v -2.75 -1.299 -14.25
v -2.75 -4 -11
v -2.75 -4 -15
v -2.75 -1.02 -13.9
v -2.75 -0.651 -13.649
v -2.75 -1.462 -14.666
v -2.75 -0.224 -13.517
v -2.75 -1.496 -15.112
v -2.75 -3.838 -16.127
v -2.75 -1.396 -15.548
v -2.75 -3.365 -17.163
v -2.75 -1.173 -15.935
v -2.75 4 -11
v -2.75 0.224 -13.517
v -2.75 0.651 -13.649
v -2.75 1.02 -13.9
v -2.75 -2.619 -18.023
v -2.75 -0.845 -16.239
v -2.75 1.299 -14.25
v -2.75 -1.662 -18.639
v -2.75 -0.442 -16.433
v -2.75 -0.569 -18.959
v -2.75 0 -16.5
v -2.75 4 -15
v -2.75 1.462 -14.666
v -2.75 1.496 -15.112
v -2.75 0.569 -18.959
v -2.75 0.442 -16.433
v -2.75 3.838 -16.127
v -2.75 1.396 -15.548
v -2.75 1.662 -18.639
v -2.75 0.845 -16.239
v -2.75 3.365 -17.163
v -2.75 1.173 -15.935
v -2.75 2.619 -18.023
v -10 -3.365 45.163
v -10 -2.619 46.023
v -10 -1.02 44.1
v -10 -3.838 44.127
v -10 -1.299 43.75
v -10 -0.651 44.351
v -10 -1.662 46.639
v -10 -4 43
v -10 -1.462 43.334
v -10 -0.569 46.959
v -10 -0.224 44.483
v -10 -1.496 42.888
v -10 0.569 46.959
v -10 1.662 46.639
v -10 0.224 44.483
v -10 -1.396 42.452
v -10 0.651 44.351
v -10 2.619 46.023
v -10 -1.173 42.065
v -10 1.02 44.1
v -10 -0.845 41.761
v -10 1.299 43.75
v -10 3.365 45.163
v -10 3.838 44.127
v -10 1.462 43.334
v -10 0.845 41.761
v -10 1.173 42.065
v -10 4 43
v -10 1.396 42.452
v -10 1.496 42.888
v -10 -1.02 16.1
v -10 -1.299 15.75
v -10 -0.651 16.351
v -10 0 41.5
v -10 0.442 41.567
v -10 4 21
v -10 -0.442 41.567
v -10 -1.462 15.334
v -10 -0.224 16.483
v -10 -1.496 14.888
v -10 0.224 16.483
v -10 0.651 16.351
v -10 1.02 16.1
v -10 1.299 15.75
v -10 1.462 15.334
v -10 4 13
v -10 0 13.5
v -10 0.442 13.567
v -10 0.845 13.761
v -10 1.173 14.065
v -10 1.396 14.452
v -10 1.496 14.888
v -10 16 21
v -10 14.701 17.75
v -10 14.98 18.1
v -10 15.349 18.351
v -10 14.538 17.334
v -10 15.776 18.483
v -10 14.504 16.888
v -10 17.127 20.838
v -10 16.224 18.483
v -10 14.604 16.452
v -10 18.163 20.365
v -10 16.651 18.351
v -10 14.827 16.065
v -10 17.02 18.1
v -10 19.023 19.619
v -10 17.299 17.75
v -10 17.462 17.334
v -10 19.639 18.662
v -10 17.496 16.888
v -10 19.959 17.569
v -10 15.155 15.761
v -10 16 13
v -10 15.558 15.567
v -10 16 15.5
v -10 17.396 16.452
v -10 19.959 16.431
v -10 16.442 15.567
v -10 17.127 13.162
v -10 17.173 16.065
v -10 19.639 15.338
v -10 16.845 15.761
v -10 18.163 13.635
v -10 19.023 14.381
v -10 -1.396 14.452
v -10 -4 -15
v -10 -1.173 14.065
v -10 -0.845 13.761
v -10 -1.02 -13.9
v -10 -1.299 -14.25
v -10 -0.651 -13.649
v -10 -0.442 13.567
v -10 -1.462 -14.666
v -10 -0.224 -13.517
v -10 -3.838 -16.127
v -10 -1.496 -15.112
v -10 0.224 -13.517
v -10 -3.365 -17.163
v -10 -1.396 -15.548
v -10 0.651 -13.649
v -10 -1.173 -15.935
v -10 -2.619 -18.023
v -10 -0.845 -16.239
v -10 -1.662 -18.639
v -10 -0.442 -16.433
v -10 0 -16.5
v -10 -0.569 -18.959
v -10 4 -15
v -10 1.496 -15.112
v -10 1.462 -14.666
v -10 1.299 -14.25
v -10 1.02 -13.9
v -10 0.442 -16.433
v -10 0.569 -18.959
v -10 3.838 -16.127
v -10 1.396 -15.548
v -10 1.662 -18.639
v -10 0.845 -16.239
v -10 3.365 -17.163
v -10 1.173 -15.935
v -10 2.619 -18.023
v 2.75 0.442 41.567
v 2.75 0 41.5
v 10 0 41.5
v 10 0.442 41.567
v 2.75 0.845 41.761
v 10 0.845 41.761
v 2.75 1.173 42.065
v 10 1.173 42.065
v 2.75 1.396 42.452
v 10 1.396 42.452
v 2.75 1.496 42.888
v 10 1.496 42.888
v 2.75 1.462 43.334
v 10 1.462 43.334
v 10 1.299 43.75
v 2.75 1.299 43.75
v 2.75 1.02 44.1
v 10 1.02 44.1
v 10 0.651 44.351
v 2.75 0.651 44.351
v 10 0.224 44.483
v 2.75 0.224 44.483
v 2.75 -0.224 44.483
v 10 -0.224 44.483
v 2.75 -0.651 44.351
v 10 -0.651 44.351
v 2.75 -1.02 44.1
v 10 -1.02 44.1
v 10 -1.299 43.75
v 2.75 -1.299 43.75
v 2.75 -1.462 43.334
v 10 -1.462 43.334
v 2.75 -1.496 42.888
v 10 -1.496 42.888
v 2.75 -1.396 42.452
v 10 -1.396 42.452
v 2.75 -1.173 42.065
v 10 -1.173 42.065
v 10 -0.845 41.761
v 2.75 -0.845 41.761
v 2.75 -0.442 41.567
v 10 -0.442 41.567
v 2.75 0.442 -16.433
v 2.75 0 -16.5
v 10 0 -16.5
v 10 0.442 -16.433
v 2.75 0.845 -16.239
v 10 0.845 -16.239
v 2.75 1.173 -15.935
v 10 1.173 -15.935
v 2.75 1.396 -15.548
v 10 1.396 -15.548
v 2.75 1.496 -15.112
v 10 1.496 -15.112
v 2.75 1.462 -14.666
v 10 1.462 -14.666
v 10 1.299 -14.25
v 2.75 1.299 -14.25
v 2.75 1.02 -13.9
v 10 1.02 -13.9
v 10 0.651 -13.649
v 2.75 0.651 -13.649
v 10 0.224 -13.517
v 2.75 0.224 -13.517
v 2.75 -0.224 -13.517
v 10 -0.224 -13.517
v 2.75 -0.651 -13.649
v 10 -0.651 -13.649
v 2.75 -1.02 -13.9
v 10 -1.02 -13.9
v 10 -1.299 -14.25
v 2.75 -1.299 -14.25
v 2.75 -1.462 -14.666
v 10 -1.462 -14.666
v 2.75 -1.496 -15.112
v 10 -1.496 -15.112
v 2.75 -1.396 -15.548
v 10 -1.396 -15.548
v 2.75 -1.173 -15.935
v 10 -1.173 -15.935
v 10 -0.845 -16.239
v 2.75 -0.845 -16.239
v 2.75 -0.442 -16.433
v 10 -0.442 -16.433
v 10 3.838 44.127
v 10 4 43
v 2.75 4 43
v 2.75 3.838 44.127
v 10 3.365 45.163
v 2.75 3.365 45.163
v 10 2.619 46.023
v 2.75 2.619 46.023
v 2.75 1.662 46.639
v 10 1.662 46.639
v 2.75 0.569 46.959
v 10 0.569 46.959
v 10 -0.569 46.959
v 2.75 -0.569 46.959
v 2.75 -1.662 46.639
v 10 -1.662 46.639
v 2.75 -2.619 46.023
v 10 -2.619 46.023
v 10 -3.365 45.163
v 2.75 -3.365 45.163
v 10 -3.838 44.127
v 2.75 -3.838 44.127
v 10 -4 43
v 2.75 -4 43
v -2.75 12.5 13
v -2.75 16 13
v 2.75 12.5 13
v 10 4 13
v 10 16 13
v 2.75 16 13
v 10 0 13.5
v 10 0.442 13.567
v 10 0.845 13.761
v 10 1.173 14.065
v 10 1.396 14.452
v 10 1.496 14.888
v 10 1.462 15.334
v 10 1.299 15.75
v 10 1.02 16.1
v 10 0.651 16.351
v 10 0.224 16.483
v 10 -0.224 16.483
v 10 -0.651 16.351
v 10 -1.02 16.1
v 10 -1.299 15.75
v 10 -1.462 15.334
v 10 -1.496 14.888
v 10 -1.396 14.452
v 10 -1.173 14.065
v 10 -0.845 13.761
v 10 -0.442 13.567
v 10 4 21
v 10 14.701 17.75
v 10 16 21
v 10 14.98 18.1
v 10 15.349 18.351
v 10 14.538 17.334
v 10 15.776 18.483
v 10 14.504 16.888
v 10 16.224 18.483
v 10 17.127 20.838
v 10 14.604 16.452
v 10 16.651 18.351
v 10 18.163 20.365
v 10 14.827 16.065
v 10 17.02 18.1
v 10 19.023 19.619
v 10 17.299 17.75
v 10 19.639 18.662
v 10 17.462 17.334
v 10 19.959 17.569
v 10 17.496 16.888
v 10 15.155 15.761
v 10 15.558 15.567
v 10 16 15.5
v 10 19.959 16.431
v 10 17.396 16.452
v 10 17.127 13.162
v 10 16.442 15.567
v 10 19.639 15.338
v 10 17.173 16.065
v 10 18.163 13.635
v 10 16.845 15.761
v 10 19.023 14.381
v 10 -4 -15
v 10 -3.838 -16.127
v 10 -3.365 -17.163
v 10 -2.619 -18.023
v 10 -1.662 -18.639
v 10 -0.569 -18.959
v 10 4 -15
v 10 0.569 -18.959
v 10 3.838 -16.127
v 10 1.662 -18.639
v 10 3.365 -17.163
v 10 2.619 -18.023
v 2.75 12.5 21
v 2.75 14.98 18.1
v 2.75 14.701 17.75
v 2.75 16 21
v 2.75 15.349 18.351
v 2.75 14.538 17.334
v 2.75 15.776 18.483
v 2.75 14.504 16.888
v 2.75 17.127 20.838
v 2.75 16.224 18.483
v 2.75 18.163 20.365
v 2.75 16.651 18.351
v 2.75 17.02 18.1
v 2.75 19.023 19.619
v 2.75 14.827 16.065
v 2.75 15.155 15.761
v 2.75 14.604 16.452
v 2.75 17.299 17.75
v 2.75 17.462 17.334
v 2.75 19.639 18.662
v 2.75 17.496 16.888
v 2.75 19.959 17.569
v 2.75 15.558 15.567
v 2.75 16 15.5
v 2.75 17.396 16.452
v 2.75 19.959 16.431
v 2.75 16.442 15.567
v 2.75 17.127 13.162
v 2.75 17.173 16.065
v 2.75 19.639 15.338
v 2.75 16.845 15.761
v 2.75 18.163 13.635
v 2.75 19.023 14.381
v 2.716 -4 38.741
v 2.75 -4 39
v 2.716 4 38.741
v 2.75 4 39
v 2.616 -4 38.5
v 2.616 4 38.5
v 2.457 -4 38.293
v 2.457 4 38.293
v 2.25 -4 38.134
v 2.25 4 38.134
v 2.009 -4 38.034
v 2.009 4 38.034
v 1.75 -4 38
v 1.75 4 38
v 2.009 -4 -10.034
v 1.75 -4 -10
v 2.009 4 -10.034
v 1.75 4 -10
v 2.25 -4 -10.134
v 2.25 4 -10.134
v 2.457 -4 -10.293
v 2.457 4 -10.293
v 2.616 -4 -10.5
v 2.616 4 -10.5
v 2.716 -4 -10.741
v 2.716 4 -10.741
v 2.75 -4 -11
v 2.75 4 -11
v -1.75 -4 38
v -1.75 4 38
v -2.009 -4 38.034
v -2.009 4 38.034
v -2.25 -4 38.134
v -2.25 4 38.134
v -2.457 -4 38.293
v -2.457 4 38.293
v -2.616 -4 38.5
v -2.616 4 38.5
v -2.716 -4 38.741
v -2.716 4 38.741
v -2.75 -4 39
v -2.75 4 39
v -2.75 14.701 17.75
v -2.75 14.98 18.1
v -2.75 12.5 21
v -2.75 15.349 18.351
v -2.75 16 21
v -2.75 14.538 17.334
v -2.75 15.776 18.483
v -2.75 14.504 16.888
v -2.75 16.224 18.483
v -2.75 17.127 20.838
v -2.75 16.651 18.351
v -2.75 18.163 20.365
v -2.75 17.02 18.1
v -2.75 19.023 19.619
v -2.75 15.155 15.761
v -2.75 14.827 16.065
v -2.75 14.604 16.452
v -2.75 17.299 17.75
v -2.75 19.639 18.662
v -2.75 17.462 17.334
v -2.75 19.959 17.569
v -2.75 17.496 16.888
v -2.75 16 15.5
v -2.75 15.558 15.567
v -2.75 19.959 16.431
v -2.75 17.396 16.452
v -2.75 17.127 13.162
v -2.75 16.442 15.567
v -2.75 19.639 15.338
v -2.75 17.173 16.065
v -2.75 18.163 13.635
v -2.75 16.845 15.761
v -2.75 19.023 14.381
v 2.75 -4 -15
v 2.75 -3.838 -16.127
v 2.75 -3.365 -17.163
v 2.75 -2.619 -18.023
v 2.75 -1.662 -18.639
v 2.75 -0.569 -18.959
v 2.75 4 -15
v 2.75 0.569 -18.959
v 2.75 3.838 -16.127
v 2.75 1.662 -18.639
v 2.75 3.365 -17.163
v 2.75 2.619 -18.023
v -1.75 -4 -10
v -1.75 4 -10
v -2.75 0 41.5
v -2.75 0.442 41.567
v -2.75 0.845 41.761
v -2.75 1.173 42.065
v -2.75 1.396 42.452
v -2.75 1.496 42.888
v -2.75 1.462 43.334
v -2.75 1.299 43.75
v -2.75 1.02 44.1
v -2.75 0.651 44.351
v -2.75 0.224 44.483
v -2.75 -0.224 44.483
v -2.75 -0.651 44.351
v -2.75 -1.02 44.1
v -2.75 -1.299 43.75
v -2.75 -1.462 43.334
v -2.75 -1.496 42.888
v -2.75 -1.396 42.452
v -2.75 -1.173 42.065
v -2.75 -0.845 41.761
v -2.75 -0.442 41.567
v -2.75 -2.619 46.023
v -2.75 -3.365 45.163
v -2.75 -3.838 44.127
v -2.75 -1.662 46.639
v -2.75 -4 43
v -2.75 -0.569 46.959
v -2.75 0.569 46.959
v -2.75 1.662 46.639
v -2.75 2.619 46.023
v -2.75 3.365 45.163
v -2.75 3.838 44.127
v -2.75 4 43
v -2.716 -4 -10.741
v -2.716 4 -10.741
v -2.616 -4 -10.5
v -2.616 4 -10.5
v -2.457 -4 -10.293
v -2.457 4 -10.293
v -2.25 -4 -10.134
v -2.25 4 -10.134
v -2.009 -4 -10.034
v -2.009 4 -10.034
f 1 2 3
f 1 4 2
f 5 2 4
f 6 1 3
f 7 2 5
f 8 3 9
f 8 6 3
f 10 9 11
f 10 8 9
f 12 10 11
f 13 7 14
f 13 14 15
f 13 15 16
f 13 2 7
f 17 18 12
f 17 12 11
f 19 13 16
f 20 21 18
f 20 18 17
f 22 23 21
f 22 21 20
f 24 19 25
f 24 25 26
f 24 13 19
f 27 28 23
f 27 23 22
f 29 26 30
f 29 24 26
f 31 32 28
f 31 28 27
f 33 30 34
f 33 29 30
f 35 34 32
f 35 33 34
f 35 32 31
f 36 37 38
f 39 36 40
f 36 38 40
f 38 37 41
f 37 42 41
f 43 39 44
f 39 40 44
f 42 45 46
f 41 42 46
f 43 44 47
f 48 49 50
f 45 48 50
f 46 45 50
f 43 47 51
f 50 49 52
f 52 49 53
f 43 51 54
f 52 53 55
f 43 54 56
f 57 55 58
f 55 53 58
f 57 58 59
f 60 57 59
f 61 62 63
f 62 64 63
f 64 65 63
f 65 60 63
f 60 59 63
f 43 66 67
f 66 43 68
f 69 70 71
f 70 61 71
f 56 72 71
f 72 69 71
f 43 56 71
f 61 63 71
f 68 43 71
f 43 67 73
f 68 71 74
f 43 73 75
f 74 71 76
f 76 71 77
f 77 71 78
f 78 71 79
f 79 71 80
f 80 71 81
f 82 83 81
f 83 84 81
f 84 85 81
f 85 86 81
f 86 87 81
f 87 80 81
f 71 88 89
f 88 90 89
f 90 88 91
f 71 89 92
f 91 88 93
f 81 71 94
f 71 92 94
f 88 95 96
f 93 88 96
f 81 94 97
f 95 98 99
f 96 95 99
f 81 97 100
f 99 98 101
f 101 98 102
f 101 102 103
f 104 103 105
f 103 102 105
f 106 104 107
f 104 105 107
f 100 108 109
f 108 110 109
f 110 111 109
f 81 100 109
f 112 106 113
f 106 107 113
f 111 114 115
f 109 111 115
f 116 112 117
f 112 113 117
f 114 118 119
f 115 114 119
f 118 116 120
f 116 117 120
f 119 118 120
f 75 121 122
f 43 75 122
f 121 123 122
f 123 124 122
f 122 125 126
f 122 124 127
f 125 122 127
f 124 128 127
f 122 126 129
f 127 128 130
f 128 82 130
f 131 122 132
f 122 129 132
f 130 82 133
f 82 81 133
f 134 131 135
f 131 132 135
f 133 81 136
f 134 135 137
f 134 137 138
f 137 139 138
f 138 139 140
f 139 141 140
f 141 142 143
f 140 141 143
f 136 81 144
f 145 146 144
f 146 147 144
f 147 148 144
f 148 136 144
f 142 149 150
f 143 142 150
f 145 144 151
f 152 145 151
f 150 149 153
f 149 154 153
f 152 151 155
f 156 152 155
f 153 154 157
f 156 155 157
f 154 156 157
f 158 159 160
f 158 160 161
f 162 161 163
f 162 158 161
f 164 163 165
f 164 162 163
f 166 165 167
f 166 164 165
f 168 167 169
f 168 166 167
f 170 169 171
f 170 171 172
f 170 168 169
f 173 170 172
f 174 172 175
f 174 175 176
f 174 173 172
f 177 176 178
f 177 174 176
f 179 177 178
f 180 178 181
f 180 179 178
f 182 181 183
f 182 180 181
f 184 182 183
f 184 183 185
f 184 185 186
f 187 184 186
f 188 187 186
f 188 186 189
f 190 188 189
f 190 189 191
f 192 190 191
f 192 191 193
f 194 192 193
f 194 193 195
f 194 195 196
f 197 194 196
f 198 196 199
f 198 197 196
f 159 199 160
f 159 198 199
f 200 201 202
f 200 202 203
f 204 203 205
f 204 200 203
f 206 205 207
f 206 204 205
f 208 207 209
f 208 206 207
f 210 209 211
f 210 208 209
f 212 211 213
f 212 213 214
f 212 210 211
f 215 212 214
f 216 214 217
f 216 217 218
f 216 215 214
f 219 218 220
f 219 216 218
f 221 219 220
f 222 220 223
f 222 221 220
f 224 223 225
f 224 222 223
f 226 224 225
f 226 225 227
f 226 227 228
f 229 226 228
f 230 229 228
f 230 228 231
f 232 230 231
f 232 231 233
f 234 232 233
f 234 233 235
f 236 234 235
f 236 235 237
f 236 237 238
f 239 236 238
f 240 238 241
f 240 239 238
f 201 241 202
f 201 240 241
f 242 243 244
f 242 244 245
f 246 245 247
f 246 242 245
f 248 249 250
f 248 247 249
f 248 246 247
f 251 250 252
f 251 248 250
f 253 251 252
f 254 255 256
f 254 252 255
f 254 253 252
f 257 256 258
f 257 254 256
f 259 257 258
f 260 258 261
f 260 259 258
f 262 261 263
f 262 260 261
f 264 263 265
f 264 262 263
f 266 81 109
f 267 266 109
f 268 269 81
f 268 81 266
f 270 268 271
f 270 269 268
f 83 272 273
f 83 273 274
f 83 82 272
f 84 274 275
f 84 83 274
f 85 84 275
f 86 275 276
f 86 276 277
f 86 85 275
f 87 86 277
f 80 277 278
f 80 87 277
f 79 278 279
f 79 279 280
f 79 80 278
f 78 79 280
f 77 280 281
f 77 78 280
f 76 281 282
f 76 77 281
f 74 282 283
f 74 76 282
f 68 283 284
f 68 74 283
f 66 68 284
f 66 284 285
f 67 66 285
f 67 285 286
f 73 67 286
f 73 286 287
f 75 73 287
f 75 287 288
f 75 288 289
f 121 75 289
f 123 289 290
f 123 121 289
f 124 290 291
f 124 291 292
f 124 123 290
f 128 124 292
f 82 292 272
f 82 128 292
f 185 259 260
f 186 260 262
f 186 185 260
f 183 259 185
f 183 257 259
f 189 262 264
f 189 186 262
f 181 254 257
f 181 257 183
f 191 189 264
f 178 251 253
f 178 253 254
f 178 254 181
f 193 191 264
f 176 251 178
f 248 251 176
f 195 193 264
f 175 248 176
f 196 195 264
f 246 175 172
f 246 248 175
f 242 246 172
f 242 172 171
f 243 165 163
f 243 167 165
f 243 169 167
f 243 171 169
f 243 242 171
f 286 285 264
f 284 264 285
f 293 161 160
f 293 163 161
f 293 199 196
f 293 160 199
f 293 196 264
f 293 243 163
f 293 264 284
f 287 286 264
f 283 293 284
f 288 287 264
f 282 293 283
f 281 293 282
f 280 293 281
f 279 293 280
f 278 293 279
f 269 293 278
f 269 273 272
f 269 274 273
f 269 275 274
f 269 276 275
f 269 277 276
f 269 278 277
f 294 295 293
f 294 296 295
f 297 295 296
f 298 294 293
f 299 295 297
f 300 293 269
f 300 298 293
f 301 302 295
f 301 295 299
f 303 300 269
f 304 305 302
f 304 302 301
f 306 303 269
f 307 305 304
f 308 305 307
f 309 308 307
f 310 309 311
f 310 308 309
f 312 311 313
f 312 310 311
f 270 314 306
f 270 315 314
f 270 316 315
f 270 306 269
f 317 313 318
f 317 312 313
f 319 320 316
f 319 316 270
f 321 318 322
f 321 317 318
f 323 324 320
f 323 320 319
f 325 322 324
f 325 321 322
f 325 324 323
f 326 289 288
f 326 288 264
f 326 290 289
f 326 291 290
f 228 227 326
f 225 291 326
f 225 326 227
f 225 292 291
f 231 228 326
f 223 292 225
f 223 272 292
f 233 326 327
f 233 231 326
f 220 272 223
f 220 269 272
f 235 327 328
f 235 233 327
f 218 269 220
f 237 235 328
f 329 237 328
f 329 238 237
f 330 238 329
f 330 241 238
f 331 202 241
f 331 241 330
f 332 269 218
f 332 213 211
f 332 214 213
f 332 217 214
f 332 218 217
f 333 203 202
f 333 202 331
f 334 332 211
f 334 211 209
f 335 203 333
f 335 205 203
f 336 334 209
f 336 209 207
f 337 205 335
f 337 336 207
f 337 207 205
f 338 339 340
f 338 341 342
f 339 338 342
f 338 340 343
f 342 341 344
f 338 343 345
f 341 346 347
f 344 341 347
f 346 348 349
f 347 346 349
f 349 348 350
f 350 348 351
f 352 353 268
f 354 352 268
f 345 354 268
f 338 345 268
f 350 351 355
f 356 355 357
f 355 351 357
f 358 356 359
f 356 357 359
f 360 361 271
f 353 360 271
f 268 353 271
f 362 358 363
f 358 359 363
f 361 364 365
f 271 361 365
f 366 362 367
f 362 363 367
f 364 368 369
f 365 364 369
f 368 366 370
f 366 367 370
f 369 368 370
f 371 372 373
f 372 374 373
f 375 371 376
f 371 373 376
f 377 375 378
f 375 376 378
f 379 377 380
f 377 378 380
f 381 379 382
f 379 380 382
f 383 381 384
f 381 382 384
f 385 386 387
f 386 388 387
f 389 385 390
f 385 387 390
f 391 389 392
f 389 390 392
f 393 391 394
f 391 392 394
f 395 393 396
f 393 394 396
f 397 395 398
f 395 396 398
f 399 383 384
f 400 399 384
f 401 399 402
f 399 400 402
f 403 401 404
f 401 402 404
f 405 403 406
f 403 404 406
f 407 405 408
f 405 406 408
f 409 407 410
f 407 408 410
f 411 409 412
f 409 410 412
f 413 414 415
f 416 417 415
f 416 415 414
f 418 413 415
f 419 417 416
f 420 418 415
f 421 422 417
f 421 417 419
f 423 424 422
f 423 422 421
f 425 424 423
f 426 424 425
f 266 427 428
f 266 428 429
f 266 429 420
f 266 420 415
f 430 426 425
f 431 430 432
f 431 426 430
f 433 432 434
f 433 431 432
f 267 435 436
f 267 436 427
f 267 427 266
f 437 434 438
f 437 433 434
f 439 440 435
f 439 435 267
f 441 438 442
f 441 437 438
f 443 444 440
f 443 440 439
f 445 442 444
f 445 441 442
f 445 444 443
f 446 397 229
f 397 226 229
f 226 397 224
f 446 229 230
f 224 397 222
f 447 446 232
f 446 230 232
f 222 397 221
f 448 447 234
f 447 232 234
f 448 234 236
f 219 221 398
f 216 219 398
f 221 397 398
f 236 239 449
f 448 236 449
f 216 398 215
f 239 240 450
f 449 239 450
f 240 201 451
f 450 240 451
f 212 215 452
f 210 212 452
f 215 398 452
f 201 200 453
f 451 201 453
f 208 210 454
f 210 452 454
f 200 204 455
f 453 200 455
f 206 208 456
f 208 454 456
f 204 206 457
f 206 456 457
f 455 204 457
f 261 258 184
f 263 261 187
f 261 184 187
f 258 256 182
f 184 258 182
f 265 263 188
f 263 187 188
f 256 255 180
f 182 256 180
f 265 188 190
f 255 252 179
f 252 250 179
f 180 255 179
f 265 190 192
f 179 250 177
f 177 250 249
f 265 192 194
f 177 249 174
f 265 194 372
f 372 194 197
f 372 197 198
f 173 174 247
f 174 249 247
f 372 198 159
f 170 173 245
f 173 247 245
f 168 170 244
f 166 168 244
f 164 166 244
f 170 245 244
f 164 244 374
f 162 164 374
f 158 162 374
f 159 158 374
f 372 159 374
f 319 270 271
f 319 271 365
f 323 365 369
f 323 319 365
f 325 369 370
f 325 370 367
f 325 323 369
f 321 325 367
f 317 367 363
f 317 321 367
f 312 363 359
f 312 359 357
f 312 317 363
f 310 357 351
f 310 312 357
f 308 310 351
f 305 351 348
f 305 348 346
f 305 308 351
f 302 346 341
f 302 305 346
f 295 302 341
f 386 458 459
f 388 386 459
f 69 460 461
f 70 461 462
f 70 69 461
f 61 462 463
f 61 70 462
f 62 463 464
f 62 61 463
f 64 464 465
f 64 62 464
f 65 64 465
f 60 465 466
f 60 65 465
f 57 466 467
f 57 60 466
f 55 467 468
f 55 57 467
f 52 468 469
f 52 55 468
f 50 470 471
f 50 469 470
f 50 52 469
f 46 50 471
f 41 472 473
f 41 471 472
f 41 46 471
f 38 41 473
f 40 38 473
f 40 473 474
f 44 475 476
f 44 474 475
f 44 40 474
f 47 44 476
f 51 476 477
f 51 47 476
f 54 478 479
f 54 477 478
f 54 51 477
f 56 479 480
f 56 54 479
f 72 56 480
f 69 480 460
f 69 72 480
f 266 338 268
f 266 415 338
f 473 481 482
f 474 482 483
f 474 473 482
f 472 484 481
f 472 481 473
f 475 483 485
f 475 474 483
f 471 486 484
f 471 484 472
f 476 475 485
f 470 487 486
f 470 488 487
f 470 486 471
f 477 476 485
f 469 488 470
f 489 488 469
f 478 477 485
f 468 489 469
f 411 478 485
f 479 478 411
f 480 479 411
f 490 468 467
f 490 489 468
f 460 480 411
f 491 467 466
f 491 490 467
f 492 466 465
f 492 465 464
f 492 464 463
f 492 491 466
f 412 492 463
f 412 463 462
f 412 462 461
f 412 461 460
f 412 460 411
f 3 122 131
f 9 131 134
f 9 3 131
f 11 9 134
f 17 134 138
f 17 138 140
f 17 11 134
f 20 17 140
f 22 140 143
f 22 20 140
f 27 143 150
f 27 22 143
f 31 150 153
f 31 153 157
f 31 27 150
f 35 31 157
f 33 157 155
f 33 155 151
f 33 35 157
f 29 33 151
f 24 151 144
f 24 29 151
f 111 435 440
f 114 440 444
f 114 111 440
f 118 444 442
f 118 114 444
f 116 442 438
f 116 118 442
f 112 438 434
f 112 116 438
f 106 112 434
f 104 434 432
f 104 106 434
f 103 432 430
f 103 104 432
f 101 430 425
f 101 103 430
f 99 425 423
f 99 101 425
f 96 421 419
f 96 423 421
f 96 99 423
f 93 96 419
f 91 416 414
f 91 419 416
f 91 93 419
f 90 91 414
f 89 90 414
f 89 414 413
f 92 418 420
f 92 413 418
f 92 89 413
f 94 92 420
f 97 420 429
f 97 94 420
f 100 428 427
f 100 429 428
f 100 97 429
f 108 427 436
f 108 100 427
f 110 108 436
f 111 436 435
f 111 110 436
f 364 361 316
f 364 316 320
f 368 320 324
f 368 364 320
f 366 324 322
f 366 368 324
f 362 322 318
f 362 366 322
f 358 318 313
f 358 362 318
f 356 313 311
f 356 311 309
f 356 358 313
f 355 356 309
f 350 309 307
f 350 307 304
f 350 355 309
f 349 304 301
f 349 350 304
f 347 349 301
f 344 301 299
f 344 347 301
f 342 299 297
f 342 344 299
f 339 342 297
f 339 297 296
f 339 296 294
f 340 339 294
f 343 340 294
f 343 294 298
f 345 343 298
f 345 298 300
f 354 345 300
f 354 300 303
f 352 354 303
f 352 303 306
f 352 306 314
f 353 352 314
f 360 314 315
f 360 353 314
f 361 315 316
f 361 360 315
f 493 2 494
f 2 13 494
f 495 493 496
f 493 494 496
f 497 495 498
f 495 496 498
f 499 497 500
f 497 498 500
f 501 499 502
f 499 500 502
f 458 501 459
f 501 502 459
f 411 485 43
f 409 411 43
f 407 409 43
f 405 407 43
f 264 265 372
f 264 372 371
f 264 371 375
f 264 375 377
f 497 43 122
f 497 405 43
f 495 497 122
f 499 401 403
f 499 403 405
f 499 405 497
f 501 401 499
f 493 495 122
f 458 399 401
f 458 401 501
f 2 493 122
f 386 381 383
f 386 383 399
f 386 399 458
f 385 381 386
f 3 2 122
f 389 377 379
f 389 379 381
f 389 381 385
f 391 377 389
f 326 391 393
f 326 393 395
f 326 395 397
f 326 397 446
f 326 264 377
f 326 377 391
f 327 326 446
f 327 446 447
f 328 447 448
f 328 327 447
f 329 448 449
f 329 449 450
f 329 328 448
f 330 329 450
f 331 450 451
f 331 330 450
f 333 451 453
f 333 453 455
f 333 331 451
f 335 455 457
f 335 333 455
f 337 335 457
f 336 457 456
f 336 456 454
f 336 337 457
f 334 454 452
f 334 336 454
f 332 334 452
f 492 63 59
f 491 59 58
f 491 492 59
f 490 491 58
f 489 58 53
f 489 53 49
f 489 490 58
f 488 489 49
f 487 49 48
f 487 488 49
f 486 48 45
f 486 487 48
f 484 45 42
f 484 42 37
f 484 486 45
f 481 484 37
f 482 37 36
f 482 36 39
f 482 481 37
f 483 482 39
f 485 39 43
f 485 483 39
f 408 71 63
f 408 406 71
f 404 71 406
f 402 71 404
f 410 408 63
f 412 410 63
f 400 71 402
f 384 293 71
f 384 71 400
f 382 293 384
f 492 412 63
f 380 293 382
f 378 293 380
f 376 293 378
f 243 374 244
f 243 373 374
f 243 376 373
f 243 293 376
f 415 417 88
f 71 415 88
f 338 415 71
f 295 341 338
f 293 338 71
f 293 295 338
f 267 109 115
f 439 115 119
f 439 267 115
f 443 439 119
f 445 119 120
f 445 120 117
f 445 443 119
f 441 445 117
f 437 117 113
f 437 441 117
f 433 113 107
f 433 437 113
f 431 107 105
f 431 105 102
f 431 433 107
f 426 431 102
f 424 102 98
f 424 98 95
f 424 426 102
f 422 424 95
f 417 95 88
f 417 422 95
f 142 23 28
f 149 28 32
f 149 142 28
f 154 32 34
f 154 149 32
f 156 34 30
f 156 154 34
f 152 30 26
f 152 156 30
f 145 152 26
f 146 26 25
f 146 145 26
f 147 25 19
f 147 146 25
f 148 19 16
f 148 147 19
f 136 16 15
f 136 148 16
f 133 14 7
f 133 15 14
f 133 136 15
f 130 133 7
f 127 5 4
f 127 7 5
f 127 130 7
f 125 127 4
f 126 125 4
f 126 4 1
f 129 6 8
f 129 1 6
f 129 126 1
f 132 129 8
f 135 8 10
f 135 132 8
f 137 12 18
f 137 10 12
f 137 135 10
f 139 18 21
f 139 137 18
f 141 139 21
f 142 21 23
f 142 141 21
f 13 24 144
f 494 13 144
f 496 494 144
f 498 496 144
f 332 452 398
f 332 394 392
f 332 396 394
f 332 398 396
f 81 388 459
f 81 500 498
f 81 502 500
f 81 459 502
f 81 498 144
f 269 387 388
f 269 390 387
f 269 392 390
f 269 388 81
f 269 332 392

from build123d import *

# Parameters (mm, degrees)
CROQUIS1_R              = 1.5
SALIENTE_EXTRUIR1_DEPTH = 10
CROQUIS2_W              = 8
CROQUIS2_H              = 7.5
CROQUIS2_W_2            = 9
CROQUIS2_H_2            = 8
CORTAR_EXTRUIR1_DEPTH   = 2.75
REDONDEO1_R             = 1


with BuildPart() as part:
    # Croquis1 → Saliente-Extruir1 (new, symmetric)
    with BuildSketch(Plane(origin=(0, 0, 0), x_dir=(0, 0, -1), z_dir=(1, 0, 0))):
        with BuildLine():
            Line((-15, -4), (15, -4))
            ThreePointArc((15, -4), (19, 0), (15, 4))
            Line((15, 4), (-13, 4))
            Line((-13, 4), (-13, 16))
            ThreePointArc((-13, 16), (-17, 20), (-21, 16))
            Line((-21, 16), (-21, 4))
            Line((-21, 4), (-43, 4))
            ThreePointArc((-43, 4), (-47, 0), (-43, -4))
            Line((-43, -4), (-15, -4))
        make_face()
        with Locations((15, 0)):
            Circle(CROQUIS1_R, mode=Mode.SUBTRACT)
        with Locations((-17, 16)):
            Circle(CROQUIS1_R, mode=Mode.SUBTRACT)
        with Locations((-15, 0)):
            Circle(CROQUIS1_R, mode=Mode.SUBTRACT)
        with Locations((-43, 0)):
            Circle(CROQUIS1_R, mode=Mode.SUBTRACT)
    extrude(amount=SALIENTE_EXTRUIR1_DEPTH, both=True)

    # Croquis2 → Cortar-Extruir1 (cut, symmetric)
    with BuildSketch(Plane(origin=(0, 0, 0), x_dir=(0, 0, -1), z_dir=(1, 0, 0))):
        with Locations((-17, 16.25)):
            Rectangle(CROQUIS2_W, CROQUIS2_H)
        with Locations((14.5, 0)):
            Rectangle(CROQUIS2_W_2, CROQUIS2_H_2)
        with Locations((-42.5, 0)):
            Rectangle(CROQUIS2_W_2, CROQUIS2_H_2)
    extrude(amount=CORTAR_EXTRUIR1_DEPTH, both=True, mode=Mode.SUBTRACT)

    # Redondeo1
    redondeo1_edges = [part.edges().sort_by_distance(p)[0] for p in [
        (2.75, 0, 38),
        (-2.75, 0, 38),
        (2.75, 0, -10),
        (-2.75, 0, -10),
    ]]
    fillet(redondeo1_edges, radius=REDONDEO1_R)


solid = part.part
